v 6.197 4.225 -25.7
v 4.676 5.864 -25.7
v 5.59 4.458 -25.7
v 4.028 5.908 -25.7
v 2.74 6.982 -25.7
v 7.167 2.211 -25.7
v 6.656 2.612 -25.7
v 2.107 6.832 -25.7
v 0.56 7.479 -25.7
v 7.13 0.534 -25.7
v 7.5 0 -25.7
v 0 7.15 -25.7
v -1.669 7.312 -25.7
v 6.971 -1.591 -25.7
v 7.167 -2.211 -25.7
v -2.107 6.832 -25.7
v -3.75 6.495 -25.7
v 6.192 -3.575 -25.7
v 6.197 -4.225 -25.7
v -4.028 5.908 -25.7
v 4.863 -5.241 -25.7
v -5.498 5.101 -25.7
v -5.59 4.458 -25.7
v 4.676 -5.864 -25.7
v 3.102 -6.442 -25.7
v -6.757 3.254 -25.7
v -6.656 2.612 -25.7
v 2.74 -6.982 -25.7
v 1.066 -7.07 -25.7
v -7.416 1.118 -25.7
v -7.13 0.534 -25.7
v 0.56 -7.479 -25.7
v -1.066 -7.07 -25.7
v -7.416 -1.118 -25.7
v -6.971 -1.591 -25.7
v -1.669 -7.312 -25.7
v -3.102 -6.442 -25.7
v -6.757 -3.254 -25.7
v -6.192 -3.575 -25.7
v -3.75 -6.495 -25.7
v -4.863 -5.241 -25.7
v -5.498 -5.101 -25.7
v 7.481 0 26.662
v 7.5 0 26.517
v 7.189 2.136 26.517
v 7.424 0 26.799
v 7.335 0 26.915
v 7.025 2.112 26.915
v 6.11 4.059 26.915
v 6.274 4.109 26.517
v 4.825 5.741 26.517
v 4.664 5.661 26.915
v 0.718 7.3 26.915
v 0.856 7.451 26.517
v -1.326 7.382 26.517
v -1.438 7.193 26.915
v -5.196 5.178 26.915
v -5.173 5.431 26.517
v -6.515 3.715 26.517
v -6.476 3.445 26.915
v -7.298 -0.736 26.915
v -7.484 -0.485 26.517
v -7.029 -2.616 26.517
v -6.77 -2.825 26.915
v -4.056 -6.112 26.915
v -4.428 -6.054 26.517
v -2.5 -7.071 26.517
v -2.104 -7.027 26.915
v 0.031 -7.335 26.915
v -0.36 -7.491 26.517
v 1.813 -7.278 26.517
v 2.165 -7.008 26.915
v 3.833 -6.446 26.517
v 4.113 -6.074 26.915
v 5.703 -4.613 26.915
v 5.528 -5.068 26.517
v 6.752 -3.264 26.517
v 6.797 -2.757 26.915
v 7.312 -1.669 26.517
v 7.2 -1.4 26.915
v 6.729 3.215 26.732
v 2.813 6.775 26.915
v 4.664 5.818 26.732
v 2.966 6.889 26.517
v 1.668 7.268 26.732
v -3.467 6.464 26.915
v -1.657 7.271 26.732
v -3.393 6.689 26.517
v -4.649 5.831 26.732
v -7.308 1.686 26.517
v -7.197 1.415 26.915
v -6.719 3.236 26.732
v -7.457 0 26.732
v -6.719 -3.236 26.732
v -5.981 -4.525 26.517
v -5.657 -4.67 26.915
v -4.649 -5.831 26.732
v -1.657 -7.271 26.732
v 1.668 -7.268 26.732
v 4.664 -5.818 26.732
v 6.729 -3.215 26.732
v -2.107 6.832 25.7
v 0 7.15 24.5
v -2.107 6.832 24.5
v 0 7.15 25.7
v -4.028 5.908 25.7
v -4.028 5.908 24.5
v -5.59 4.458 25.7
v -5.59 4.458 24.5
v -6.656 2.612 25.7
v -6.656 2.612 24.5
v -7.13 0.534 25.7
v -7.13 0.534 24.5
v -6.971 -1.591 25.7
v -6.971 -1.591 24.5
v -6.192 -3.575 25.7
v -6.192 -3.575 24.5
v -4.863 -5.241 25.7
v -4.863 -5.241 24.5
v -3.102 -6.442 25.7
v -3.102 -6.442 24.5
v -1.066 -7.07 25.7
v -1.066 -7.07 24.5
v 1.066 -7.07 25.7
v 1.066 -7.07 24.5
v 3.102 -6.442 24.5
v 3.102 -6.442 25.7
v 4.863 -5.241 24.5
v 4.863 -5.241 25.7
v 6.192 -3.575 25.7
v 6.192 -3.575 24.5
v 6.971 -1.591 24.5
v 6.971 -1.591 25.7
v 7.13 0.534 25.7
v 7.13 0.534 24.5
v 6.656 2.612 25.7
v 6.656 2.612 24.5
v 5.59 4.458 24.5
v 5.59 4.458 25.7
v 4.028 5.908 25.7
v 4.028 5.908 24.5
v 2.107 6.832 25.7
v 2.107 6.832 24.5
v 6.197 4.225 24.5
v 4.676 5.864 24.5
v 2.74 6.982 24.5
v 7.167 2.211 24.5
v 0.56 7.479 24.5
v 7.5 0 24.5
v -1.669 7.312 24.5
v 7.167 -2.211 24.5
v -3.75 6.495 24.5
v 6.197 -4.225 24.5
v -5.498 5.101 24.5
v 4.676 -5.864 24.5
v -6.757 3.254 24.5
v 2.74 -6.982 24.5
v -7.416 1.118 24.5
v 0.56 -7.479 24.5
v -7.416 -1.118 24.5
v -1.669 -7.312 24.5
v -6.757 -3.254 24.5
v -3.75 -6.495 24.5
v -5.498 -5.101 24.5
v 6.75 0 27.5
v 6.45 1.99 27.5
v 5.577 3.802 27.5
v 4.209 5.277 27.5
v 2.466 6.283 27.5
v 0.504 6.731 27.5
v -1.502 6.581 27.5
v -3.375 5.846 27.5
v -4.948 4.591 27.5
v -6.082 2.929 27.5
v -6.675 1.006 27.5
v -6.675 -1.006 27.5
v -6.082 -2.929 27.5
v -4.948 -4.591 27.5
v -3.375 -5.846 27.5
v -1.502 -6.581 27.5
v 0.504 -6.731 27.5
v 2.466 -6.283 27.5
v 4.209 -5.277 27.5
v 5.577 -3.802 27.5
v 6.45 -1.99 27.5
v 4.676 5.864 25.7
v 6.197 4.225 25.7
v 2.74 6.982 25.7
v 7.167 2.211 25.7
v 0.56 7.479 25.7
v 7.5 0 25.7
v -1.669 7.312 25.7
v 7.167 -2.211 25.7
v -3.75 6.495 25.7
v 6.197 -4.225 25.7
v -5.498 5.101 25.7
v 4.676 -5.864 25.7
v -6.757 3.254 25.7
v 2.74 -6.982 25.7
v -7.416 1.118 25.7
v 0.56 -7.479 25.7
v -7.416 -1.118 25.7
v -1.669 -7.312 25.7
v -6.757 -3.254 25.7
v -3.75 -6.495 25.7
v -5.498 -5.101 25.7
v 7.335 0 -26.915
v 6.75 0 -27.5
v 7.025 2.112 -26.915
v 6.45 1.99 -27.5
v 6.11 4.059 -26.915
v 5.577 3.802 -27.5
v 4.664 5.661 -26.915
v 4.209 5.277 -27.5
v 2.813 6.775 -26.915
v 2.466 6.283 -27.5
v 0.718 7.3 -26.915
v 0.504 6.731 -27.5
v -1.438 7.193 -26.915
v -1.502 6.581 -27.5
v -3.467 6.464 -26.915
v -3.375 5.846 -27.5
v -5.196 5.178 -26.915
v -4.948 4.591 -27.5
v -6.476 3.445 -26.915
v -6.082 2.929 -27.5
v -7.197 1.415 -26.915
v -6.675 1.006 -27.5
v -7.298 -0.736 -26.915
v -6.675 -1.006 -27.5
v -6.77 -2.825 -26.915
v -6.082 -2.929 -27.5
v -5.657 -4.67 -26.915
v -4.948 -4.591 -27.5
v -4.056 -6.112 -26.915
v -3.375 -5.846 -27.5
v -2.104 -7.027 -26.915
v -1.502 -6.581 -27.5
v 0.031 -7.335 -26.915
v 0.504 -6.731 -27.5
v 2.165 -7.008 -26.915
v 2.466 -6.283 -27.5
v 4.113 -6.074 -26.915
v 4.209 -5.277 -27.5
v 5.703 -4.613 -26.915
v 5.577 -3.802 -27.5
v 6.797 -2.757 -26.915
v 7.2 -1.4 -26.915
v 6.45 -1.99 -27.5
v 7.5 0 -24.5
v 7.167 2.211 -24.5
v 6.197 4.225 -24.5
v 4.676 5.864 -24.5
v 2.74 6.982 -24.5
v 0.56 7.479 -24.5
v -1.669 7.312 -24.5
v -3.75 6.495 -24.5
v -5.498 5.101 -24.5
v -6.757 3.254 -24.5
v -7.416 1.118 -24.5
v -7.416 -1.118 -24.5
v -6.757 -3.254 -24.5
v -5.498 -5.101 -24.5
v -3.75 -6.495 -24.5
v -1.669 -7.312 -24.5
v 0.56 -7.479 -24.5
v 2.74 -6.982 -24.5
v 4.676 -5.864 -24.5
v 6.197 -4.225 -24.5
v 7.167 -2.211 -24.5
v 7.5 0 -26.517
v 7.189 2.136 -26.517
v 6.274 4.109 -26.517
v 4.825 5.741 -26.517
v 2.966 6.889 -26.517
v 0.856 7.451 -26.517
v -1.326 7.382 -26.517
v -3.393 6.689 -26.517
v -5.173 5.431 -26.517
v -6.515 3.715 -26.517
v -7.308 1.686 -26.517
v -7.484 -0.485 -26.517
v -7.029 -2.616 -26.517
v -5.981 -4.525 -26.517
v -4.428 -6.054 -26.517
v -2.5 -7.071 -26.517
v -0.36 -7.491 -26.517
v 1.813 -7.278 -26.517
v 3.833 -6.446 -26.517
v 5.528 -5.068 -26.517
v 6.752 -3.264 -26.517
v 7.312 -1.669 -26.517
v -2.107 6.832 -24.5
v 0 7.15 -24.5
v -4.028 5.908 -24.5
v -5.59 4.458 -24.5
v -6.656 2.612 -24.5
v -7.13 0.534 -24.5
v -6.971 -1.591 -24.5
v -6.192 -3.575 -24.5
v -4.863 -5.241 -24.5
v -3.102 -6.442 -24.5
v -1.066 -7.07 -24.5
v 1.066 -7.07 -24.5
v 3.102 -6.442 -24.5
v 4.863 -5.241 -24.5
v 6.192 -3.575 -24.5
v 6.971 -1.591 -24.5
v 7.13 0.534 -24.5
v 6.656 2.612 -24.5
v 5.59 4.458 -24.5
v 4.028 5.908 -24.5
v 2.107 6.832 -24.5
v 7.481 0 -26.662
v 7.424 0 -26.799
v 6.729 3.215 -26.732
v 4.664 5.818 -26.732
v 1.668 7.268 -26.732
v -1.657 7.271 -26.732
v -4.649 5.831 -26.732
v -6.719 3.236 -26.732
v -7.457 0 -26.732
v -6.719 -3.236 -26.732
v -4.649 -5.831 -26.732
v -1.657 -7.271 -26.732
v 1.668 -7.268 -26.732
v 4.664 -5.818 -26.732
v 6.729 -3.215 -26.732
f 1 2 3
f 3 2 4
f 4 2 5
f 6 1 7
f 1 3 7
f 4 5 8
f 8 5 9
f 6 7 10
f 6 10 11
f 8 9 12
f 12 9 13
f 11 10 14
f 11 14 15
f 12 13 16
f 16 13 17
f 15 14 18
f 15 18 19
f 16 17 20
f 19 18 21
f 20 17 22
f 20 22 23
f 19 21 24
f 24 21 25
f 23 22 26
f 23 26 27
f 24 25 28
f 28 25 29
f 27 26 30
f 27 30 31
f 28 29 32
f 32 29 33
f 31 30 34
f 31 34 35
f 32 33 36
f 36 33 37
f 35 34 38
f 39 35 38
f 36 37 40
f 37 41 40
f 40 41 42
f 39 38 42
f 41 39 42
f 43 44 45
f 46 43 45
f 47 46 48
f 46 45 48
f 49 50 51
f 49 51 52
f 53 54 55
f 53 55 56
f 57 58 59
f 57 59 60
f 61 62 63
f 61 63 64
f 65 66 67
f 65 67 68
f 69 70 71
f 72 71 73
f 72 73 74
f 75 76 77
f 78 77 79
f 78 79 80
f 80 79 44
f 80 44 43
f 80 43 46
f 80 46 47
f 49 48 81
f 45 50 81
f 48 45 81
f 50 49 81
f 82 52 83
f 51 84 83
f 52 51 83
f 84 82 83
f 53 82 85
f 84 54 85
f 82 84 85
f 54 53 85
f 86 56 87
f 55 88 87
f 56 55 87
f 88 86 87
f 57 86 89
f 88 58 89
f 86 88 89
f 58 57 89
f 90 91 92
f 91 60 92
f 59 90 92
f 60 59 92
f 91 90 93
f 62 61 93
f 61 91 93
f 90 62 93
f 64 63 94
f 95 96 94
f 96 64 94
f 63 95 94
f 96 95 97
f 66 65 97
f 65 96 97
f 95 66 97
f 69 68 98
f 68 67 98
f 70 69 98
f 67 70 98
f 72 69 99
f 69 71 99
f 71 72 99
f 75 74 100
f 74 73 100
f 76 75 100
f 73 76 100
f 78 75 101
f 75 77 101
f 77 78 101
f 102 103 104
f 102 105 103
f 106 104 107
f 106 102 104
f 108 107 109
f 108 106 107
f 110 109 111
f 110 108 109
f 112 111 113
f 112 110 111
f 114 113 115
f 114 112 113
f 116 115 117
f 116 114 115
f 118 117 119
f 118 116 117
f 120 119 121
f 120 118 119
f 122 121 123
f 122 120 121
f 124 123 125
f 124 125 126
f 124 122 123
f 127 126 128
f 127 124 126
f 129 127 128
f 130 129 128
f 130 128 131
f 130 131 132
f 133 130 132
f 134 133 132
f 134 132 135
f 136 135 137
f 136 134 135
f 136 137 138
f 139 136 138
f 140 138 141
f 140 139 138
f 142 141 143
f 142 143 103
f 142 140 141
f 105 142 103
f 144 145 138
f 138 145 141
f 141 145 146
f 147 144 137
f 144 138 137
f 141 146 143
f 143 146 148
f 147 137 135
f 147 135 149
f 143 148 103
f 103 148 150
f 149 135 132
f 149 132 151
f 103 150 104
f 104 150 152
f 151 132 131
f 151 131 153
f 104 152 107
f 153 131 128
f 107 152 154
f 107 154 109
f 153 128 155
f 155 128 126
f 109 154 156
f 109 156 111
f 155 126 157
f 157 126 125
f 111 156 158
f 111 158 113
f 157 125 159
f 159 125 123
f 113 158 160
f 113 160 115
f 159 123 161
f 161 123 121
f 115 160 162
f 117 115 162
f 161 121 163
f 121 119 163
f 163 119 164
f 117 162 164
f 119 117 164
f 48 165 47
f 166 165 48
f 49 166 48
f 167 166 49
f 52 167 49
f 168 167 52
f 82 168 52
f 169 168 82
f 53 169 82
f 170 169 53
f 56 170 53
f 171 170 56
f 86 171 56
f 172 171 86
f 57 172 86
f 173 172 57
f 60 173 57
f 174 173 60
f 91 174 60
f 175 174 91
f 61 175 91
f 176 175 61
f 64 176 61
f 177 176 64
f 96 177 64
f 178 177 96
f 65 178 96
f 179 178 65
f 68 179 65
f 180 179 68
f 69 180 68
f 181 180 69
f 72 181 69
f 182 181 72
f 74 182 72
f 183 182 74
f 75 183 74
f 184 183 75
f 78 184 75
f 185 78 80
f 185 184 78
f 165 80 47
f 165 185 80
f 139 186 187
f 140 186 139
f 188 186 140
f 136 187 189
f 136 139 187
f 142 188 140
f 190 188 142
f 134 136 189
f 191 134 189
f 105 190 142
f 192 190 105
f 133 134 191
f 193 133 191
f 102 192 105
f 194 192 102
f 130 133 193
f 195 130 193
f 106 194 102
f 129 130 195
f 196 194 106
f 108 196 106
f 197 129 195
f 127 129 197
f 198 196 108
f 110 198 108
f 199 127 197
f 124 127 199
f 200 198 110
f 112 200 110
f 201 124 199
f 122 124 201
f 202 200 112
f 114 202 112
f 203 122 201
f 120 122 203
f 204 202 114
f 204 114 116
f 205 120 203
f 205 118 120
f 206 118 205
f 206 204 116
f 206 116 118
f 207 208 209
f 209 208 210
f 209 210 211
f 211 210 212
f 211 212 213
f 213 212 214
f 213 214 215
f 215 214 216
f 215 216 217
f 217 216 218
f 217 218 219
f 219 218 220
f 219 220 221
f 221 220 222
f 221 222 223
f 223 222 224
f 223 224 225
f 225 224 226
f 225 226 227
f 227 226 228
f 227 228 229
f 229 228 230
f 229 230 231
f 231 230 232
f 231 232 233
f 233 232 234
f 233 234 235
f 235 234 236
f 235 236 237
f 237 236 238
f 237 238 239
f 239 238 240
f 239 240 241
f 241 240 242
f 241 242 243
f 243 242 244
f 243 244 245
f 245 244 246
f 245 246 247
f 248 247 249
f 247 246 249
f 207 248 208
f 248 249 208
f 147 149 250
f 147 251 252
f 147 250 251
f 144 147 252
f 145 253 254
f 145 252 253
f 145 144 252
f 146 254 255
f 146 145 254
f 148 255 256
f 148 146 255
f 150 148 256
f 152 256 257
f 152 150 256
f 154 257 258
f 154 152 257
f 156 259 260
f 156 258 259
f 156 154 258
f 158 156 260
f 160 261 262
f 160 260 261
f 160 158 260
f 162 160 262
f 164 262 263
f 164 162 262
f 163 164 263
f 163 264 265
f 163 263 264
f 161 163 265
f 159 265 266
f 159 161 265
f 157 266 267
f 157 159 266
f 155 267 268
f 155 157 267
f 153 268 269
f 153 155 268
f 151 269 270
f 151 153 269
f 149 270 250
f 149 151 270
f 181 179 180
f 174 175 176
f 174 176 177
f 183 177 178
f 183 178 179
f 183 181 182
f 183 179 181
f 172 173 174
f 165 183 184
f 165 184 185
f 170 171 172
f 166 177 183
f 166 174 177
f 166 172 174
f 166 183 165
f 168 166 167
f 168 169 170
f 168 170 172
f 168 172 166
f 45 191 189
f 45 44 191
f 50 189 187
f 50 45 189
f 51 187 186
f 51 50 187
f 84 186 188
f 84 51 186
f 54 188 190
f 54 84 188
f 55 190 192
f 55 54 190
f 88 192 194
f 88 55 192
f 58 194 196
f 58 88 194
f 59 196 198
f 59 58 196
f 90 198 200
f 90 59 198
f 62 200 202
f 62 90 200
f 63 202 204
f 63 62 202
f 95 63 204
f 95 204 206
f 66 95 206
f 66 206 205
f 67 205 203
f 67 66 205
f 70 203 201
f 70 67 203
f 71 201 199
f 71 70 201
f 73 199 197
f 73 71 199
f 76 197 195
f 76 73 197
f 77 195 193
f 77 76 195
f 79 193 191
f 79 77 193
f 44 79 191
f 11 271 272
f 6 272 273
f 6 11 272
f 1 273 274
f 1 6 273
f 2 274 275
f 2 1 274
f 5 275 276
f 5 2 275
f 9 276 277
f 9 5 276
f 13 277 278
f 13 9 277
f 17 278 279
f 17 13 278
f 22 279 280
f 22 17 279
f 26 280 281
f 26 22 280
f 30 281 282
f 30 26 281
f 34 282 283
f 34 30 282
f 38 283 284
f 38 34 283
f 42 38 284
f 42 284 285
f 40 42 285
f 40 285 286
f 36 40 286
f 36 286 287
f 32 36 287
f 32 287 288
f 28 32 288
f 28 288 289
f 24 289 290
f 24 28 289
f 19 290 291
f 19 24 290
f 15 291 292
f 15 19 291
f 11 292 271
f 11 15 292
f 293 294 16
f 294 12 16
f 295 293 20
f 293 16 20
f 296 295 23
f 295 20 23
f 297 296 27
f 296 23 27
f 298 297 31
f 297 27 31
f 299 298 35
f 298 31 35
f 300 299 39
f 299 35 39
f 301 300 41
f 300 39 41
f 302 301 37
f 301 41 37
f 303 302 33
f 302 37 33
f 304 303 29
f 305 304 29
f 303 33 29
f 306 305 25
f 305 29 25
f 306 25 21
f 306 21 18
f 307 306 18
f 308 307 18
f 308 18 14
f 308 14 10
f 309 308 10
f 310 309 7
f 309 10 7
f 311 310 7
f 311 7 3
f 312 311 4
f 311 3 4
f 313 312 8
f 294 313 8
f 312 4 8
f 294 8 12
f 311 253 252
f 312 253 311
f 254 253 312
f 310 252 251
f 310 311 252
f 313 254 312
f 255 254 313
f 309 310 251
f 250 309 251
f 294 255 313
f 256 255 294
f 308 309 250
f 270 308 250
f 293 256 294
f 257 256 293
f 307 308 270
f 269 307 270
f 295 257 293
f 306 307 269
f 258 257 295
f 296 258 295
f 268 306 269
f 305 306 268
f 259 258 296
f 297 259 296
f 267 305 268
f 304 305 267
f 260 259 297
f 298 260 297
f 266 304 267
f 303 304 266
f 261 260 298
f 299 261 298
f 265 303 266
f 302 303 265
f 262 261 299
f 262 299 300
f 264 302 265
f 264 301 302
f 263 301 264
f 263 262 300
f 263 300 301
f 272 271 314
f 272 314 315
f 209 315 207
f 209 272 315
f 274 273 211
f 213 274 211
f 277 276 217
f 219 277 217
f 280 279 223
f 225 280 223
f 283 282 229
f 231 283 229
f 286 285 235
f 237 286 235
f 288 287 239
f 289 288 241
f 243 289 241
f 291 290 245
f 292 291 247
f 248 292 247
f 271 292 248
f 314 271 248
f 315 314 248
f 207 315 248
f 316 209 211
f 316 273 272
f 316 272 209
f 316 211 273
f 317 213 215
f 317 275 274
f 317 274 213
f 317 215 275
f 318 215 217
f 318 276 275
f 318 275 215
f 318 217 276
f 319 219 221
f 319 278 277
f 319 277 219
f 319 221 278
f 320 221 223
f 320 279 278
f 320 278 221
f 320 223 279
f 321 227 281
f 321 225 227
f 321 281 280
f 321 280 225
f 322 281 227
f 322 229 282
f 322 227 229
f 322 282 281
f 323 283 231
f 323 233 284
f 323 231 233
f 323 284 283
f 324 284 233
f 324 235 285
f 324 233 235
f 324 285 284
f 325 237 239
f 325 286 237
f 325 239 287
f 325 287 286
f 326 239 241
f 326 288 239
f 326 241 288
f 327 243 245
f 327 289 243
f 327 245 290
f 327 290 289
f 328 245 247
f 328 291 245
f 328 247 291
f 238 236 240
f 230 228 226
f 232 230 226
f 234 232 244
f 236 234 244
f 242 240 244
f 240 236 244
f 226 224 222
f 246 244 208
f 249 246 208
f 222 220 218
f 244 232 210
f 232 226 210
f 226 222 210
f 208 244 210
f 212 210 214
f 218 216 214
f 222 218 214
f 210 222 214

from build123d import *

# Parameters (mm, degrees)
SKETCH3_R           = 7.5
BOSS_EXTRUDE1_DEPTH = 27.5
CHAMFER1_SIZE       = 0.75
FILLET2_R           = 0.5625
SKETCH4_W           = 1.2
SKETCH4_H           = 0.35


with BuildPart() as part:
    # Sketch3 → Boss-Extrude1 (new, symmetric)
    with BuildSketch(Plane.XY):
        Circle(SKETCH3_R)
    extrude(amount=BOSS_EXTRUDE1_DEPTH, both=True)

    # Chamfer1
    chamfer1_edges = [part.edges().sort_by_distance(p)[0] for p in [
        (-7.5, 0, -27.5),
        (-7.5, 0, 27.5),
    ]]
    chamfer(chamfer1_edges, length=CHAMFER1_SIZE)

    # Fillet2
    fillet2_edges = [part.edges().sort_by_distance(p)[0] for p in [
        (-7.5, 0, -26.75),
        (-7.5, 0, 26.75),
    ]]
    fillet(fillet2_edges, radius=FILLET2_R)

    # Sketch4 → Cut-Revolve1 (revolve, cut)
    with BuildSketch(Plane(origin=(0, 0, 0), x_dir=(0, 0, -1), z_dir=(1, 0, 0))):
        with Locations((25.1, 7.325)):
            Rectangle(SKETCH4_W, SKETCH4_H)
    cut_revolve1 = revolve(axis=Axis((0, 0, -27.5), (0, 0, 1)), mode=Mode.SUBTRACT)

    # Mirror1: Cut-Revolve1 across plane
    add(cut_revolve1.mirror(Plane.XY), mode=Mode.SUBTRACT)


solid = part.part
